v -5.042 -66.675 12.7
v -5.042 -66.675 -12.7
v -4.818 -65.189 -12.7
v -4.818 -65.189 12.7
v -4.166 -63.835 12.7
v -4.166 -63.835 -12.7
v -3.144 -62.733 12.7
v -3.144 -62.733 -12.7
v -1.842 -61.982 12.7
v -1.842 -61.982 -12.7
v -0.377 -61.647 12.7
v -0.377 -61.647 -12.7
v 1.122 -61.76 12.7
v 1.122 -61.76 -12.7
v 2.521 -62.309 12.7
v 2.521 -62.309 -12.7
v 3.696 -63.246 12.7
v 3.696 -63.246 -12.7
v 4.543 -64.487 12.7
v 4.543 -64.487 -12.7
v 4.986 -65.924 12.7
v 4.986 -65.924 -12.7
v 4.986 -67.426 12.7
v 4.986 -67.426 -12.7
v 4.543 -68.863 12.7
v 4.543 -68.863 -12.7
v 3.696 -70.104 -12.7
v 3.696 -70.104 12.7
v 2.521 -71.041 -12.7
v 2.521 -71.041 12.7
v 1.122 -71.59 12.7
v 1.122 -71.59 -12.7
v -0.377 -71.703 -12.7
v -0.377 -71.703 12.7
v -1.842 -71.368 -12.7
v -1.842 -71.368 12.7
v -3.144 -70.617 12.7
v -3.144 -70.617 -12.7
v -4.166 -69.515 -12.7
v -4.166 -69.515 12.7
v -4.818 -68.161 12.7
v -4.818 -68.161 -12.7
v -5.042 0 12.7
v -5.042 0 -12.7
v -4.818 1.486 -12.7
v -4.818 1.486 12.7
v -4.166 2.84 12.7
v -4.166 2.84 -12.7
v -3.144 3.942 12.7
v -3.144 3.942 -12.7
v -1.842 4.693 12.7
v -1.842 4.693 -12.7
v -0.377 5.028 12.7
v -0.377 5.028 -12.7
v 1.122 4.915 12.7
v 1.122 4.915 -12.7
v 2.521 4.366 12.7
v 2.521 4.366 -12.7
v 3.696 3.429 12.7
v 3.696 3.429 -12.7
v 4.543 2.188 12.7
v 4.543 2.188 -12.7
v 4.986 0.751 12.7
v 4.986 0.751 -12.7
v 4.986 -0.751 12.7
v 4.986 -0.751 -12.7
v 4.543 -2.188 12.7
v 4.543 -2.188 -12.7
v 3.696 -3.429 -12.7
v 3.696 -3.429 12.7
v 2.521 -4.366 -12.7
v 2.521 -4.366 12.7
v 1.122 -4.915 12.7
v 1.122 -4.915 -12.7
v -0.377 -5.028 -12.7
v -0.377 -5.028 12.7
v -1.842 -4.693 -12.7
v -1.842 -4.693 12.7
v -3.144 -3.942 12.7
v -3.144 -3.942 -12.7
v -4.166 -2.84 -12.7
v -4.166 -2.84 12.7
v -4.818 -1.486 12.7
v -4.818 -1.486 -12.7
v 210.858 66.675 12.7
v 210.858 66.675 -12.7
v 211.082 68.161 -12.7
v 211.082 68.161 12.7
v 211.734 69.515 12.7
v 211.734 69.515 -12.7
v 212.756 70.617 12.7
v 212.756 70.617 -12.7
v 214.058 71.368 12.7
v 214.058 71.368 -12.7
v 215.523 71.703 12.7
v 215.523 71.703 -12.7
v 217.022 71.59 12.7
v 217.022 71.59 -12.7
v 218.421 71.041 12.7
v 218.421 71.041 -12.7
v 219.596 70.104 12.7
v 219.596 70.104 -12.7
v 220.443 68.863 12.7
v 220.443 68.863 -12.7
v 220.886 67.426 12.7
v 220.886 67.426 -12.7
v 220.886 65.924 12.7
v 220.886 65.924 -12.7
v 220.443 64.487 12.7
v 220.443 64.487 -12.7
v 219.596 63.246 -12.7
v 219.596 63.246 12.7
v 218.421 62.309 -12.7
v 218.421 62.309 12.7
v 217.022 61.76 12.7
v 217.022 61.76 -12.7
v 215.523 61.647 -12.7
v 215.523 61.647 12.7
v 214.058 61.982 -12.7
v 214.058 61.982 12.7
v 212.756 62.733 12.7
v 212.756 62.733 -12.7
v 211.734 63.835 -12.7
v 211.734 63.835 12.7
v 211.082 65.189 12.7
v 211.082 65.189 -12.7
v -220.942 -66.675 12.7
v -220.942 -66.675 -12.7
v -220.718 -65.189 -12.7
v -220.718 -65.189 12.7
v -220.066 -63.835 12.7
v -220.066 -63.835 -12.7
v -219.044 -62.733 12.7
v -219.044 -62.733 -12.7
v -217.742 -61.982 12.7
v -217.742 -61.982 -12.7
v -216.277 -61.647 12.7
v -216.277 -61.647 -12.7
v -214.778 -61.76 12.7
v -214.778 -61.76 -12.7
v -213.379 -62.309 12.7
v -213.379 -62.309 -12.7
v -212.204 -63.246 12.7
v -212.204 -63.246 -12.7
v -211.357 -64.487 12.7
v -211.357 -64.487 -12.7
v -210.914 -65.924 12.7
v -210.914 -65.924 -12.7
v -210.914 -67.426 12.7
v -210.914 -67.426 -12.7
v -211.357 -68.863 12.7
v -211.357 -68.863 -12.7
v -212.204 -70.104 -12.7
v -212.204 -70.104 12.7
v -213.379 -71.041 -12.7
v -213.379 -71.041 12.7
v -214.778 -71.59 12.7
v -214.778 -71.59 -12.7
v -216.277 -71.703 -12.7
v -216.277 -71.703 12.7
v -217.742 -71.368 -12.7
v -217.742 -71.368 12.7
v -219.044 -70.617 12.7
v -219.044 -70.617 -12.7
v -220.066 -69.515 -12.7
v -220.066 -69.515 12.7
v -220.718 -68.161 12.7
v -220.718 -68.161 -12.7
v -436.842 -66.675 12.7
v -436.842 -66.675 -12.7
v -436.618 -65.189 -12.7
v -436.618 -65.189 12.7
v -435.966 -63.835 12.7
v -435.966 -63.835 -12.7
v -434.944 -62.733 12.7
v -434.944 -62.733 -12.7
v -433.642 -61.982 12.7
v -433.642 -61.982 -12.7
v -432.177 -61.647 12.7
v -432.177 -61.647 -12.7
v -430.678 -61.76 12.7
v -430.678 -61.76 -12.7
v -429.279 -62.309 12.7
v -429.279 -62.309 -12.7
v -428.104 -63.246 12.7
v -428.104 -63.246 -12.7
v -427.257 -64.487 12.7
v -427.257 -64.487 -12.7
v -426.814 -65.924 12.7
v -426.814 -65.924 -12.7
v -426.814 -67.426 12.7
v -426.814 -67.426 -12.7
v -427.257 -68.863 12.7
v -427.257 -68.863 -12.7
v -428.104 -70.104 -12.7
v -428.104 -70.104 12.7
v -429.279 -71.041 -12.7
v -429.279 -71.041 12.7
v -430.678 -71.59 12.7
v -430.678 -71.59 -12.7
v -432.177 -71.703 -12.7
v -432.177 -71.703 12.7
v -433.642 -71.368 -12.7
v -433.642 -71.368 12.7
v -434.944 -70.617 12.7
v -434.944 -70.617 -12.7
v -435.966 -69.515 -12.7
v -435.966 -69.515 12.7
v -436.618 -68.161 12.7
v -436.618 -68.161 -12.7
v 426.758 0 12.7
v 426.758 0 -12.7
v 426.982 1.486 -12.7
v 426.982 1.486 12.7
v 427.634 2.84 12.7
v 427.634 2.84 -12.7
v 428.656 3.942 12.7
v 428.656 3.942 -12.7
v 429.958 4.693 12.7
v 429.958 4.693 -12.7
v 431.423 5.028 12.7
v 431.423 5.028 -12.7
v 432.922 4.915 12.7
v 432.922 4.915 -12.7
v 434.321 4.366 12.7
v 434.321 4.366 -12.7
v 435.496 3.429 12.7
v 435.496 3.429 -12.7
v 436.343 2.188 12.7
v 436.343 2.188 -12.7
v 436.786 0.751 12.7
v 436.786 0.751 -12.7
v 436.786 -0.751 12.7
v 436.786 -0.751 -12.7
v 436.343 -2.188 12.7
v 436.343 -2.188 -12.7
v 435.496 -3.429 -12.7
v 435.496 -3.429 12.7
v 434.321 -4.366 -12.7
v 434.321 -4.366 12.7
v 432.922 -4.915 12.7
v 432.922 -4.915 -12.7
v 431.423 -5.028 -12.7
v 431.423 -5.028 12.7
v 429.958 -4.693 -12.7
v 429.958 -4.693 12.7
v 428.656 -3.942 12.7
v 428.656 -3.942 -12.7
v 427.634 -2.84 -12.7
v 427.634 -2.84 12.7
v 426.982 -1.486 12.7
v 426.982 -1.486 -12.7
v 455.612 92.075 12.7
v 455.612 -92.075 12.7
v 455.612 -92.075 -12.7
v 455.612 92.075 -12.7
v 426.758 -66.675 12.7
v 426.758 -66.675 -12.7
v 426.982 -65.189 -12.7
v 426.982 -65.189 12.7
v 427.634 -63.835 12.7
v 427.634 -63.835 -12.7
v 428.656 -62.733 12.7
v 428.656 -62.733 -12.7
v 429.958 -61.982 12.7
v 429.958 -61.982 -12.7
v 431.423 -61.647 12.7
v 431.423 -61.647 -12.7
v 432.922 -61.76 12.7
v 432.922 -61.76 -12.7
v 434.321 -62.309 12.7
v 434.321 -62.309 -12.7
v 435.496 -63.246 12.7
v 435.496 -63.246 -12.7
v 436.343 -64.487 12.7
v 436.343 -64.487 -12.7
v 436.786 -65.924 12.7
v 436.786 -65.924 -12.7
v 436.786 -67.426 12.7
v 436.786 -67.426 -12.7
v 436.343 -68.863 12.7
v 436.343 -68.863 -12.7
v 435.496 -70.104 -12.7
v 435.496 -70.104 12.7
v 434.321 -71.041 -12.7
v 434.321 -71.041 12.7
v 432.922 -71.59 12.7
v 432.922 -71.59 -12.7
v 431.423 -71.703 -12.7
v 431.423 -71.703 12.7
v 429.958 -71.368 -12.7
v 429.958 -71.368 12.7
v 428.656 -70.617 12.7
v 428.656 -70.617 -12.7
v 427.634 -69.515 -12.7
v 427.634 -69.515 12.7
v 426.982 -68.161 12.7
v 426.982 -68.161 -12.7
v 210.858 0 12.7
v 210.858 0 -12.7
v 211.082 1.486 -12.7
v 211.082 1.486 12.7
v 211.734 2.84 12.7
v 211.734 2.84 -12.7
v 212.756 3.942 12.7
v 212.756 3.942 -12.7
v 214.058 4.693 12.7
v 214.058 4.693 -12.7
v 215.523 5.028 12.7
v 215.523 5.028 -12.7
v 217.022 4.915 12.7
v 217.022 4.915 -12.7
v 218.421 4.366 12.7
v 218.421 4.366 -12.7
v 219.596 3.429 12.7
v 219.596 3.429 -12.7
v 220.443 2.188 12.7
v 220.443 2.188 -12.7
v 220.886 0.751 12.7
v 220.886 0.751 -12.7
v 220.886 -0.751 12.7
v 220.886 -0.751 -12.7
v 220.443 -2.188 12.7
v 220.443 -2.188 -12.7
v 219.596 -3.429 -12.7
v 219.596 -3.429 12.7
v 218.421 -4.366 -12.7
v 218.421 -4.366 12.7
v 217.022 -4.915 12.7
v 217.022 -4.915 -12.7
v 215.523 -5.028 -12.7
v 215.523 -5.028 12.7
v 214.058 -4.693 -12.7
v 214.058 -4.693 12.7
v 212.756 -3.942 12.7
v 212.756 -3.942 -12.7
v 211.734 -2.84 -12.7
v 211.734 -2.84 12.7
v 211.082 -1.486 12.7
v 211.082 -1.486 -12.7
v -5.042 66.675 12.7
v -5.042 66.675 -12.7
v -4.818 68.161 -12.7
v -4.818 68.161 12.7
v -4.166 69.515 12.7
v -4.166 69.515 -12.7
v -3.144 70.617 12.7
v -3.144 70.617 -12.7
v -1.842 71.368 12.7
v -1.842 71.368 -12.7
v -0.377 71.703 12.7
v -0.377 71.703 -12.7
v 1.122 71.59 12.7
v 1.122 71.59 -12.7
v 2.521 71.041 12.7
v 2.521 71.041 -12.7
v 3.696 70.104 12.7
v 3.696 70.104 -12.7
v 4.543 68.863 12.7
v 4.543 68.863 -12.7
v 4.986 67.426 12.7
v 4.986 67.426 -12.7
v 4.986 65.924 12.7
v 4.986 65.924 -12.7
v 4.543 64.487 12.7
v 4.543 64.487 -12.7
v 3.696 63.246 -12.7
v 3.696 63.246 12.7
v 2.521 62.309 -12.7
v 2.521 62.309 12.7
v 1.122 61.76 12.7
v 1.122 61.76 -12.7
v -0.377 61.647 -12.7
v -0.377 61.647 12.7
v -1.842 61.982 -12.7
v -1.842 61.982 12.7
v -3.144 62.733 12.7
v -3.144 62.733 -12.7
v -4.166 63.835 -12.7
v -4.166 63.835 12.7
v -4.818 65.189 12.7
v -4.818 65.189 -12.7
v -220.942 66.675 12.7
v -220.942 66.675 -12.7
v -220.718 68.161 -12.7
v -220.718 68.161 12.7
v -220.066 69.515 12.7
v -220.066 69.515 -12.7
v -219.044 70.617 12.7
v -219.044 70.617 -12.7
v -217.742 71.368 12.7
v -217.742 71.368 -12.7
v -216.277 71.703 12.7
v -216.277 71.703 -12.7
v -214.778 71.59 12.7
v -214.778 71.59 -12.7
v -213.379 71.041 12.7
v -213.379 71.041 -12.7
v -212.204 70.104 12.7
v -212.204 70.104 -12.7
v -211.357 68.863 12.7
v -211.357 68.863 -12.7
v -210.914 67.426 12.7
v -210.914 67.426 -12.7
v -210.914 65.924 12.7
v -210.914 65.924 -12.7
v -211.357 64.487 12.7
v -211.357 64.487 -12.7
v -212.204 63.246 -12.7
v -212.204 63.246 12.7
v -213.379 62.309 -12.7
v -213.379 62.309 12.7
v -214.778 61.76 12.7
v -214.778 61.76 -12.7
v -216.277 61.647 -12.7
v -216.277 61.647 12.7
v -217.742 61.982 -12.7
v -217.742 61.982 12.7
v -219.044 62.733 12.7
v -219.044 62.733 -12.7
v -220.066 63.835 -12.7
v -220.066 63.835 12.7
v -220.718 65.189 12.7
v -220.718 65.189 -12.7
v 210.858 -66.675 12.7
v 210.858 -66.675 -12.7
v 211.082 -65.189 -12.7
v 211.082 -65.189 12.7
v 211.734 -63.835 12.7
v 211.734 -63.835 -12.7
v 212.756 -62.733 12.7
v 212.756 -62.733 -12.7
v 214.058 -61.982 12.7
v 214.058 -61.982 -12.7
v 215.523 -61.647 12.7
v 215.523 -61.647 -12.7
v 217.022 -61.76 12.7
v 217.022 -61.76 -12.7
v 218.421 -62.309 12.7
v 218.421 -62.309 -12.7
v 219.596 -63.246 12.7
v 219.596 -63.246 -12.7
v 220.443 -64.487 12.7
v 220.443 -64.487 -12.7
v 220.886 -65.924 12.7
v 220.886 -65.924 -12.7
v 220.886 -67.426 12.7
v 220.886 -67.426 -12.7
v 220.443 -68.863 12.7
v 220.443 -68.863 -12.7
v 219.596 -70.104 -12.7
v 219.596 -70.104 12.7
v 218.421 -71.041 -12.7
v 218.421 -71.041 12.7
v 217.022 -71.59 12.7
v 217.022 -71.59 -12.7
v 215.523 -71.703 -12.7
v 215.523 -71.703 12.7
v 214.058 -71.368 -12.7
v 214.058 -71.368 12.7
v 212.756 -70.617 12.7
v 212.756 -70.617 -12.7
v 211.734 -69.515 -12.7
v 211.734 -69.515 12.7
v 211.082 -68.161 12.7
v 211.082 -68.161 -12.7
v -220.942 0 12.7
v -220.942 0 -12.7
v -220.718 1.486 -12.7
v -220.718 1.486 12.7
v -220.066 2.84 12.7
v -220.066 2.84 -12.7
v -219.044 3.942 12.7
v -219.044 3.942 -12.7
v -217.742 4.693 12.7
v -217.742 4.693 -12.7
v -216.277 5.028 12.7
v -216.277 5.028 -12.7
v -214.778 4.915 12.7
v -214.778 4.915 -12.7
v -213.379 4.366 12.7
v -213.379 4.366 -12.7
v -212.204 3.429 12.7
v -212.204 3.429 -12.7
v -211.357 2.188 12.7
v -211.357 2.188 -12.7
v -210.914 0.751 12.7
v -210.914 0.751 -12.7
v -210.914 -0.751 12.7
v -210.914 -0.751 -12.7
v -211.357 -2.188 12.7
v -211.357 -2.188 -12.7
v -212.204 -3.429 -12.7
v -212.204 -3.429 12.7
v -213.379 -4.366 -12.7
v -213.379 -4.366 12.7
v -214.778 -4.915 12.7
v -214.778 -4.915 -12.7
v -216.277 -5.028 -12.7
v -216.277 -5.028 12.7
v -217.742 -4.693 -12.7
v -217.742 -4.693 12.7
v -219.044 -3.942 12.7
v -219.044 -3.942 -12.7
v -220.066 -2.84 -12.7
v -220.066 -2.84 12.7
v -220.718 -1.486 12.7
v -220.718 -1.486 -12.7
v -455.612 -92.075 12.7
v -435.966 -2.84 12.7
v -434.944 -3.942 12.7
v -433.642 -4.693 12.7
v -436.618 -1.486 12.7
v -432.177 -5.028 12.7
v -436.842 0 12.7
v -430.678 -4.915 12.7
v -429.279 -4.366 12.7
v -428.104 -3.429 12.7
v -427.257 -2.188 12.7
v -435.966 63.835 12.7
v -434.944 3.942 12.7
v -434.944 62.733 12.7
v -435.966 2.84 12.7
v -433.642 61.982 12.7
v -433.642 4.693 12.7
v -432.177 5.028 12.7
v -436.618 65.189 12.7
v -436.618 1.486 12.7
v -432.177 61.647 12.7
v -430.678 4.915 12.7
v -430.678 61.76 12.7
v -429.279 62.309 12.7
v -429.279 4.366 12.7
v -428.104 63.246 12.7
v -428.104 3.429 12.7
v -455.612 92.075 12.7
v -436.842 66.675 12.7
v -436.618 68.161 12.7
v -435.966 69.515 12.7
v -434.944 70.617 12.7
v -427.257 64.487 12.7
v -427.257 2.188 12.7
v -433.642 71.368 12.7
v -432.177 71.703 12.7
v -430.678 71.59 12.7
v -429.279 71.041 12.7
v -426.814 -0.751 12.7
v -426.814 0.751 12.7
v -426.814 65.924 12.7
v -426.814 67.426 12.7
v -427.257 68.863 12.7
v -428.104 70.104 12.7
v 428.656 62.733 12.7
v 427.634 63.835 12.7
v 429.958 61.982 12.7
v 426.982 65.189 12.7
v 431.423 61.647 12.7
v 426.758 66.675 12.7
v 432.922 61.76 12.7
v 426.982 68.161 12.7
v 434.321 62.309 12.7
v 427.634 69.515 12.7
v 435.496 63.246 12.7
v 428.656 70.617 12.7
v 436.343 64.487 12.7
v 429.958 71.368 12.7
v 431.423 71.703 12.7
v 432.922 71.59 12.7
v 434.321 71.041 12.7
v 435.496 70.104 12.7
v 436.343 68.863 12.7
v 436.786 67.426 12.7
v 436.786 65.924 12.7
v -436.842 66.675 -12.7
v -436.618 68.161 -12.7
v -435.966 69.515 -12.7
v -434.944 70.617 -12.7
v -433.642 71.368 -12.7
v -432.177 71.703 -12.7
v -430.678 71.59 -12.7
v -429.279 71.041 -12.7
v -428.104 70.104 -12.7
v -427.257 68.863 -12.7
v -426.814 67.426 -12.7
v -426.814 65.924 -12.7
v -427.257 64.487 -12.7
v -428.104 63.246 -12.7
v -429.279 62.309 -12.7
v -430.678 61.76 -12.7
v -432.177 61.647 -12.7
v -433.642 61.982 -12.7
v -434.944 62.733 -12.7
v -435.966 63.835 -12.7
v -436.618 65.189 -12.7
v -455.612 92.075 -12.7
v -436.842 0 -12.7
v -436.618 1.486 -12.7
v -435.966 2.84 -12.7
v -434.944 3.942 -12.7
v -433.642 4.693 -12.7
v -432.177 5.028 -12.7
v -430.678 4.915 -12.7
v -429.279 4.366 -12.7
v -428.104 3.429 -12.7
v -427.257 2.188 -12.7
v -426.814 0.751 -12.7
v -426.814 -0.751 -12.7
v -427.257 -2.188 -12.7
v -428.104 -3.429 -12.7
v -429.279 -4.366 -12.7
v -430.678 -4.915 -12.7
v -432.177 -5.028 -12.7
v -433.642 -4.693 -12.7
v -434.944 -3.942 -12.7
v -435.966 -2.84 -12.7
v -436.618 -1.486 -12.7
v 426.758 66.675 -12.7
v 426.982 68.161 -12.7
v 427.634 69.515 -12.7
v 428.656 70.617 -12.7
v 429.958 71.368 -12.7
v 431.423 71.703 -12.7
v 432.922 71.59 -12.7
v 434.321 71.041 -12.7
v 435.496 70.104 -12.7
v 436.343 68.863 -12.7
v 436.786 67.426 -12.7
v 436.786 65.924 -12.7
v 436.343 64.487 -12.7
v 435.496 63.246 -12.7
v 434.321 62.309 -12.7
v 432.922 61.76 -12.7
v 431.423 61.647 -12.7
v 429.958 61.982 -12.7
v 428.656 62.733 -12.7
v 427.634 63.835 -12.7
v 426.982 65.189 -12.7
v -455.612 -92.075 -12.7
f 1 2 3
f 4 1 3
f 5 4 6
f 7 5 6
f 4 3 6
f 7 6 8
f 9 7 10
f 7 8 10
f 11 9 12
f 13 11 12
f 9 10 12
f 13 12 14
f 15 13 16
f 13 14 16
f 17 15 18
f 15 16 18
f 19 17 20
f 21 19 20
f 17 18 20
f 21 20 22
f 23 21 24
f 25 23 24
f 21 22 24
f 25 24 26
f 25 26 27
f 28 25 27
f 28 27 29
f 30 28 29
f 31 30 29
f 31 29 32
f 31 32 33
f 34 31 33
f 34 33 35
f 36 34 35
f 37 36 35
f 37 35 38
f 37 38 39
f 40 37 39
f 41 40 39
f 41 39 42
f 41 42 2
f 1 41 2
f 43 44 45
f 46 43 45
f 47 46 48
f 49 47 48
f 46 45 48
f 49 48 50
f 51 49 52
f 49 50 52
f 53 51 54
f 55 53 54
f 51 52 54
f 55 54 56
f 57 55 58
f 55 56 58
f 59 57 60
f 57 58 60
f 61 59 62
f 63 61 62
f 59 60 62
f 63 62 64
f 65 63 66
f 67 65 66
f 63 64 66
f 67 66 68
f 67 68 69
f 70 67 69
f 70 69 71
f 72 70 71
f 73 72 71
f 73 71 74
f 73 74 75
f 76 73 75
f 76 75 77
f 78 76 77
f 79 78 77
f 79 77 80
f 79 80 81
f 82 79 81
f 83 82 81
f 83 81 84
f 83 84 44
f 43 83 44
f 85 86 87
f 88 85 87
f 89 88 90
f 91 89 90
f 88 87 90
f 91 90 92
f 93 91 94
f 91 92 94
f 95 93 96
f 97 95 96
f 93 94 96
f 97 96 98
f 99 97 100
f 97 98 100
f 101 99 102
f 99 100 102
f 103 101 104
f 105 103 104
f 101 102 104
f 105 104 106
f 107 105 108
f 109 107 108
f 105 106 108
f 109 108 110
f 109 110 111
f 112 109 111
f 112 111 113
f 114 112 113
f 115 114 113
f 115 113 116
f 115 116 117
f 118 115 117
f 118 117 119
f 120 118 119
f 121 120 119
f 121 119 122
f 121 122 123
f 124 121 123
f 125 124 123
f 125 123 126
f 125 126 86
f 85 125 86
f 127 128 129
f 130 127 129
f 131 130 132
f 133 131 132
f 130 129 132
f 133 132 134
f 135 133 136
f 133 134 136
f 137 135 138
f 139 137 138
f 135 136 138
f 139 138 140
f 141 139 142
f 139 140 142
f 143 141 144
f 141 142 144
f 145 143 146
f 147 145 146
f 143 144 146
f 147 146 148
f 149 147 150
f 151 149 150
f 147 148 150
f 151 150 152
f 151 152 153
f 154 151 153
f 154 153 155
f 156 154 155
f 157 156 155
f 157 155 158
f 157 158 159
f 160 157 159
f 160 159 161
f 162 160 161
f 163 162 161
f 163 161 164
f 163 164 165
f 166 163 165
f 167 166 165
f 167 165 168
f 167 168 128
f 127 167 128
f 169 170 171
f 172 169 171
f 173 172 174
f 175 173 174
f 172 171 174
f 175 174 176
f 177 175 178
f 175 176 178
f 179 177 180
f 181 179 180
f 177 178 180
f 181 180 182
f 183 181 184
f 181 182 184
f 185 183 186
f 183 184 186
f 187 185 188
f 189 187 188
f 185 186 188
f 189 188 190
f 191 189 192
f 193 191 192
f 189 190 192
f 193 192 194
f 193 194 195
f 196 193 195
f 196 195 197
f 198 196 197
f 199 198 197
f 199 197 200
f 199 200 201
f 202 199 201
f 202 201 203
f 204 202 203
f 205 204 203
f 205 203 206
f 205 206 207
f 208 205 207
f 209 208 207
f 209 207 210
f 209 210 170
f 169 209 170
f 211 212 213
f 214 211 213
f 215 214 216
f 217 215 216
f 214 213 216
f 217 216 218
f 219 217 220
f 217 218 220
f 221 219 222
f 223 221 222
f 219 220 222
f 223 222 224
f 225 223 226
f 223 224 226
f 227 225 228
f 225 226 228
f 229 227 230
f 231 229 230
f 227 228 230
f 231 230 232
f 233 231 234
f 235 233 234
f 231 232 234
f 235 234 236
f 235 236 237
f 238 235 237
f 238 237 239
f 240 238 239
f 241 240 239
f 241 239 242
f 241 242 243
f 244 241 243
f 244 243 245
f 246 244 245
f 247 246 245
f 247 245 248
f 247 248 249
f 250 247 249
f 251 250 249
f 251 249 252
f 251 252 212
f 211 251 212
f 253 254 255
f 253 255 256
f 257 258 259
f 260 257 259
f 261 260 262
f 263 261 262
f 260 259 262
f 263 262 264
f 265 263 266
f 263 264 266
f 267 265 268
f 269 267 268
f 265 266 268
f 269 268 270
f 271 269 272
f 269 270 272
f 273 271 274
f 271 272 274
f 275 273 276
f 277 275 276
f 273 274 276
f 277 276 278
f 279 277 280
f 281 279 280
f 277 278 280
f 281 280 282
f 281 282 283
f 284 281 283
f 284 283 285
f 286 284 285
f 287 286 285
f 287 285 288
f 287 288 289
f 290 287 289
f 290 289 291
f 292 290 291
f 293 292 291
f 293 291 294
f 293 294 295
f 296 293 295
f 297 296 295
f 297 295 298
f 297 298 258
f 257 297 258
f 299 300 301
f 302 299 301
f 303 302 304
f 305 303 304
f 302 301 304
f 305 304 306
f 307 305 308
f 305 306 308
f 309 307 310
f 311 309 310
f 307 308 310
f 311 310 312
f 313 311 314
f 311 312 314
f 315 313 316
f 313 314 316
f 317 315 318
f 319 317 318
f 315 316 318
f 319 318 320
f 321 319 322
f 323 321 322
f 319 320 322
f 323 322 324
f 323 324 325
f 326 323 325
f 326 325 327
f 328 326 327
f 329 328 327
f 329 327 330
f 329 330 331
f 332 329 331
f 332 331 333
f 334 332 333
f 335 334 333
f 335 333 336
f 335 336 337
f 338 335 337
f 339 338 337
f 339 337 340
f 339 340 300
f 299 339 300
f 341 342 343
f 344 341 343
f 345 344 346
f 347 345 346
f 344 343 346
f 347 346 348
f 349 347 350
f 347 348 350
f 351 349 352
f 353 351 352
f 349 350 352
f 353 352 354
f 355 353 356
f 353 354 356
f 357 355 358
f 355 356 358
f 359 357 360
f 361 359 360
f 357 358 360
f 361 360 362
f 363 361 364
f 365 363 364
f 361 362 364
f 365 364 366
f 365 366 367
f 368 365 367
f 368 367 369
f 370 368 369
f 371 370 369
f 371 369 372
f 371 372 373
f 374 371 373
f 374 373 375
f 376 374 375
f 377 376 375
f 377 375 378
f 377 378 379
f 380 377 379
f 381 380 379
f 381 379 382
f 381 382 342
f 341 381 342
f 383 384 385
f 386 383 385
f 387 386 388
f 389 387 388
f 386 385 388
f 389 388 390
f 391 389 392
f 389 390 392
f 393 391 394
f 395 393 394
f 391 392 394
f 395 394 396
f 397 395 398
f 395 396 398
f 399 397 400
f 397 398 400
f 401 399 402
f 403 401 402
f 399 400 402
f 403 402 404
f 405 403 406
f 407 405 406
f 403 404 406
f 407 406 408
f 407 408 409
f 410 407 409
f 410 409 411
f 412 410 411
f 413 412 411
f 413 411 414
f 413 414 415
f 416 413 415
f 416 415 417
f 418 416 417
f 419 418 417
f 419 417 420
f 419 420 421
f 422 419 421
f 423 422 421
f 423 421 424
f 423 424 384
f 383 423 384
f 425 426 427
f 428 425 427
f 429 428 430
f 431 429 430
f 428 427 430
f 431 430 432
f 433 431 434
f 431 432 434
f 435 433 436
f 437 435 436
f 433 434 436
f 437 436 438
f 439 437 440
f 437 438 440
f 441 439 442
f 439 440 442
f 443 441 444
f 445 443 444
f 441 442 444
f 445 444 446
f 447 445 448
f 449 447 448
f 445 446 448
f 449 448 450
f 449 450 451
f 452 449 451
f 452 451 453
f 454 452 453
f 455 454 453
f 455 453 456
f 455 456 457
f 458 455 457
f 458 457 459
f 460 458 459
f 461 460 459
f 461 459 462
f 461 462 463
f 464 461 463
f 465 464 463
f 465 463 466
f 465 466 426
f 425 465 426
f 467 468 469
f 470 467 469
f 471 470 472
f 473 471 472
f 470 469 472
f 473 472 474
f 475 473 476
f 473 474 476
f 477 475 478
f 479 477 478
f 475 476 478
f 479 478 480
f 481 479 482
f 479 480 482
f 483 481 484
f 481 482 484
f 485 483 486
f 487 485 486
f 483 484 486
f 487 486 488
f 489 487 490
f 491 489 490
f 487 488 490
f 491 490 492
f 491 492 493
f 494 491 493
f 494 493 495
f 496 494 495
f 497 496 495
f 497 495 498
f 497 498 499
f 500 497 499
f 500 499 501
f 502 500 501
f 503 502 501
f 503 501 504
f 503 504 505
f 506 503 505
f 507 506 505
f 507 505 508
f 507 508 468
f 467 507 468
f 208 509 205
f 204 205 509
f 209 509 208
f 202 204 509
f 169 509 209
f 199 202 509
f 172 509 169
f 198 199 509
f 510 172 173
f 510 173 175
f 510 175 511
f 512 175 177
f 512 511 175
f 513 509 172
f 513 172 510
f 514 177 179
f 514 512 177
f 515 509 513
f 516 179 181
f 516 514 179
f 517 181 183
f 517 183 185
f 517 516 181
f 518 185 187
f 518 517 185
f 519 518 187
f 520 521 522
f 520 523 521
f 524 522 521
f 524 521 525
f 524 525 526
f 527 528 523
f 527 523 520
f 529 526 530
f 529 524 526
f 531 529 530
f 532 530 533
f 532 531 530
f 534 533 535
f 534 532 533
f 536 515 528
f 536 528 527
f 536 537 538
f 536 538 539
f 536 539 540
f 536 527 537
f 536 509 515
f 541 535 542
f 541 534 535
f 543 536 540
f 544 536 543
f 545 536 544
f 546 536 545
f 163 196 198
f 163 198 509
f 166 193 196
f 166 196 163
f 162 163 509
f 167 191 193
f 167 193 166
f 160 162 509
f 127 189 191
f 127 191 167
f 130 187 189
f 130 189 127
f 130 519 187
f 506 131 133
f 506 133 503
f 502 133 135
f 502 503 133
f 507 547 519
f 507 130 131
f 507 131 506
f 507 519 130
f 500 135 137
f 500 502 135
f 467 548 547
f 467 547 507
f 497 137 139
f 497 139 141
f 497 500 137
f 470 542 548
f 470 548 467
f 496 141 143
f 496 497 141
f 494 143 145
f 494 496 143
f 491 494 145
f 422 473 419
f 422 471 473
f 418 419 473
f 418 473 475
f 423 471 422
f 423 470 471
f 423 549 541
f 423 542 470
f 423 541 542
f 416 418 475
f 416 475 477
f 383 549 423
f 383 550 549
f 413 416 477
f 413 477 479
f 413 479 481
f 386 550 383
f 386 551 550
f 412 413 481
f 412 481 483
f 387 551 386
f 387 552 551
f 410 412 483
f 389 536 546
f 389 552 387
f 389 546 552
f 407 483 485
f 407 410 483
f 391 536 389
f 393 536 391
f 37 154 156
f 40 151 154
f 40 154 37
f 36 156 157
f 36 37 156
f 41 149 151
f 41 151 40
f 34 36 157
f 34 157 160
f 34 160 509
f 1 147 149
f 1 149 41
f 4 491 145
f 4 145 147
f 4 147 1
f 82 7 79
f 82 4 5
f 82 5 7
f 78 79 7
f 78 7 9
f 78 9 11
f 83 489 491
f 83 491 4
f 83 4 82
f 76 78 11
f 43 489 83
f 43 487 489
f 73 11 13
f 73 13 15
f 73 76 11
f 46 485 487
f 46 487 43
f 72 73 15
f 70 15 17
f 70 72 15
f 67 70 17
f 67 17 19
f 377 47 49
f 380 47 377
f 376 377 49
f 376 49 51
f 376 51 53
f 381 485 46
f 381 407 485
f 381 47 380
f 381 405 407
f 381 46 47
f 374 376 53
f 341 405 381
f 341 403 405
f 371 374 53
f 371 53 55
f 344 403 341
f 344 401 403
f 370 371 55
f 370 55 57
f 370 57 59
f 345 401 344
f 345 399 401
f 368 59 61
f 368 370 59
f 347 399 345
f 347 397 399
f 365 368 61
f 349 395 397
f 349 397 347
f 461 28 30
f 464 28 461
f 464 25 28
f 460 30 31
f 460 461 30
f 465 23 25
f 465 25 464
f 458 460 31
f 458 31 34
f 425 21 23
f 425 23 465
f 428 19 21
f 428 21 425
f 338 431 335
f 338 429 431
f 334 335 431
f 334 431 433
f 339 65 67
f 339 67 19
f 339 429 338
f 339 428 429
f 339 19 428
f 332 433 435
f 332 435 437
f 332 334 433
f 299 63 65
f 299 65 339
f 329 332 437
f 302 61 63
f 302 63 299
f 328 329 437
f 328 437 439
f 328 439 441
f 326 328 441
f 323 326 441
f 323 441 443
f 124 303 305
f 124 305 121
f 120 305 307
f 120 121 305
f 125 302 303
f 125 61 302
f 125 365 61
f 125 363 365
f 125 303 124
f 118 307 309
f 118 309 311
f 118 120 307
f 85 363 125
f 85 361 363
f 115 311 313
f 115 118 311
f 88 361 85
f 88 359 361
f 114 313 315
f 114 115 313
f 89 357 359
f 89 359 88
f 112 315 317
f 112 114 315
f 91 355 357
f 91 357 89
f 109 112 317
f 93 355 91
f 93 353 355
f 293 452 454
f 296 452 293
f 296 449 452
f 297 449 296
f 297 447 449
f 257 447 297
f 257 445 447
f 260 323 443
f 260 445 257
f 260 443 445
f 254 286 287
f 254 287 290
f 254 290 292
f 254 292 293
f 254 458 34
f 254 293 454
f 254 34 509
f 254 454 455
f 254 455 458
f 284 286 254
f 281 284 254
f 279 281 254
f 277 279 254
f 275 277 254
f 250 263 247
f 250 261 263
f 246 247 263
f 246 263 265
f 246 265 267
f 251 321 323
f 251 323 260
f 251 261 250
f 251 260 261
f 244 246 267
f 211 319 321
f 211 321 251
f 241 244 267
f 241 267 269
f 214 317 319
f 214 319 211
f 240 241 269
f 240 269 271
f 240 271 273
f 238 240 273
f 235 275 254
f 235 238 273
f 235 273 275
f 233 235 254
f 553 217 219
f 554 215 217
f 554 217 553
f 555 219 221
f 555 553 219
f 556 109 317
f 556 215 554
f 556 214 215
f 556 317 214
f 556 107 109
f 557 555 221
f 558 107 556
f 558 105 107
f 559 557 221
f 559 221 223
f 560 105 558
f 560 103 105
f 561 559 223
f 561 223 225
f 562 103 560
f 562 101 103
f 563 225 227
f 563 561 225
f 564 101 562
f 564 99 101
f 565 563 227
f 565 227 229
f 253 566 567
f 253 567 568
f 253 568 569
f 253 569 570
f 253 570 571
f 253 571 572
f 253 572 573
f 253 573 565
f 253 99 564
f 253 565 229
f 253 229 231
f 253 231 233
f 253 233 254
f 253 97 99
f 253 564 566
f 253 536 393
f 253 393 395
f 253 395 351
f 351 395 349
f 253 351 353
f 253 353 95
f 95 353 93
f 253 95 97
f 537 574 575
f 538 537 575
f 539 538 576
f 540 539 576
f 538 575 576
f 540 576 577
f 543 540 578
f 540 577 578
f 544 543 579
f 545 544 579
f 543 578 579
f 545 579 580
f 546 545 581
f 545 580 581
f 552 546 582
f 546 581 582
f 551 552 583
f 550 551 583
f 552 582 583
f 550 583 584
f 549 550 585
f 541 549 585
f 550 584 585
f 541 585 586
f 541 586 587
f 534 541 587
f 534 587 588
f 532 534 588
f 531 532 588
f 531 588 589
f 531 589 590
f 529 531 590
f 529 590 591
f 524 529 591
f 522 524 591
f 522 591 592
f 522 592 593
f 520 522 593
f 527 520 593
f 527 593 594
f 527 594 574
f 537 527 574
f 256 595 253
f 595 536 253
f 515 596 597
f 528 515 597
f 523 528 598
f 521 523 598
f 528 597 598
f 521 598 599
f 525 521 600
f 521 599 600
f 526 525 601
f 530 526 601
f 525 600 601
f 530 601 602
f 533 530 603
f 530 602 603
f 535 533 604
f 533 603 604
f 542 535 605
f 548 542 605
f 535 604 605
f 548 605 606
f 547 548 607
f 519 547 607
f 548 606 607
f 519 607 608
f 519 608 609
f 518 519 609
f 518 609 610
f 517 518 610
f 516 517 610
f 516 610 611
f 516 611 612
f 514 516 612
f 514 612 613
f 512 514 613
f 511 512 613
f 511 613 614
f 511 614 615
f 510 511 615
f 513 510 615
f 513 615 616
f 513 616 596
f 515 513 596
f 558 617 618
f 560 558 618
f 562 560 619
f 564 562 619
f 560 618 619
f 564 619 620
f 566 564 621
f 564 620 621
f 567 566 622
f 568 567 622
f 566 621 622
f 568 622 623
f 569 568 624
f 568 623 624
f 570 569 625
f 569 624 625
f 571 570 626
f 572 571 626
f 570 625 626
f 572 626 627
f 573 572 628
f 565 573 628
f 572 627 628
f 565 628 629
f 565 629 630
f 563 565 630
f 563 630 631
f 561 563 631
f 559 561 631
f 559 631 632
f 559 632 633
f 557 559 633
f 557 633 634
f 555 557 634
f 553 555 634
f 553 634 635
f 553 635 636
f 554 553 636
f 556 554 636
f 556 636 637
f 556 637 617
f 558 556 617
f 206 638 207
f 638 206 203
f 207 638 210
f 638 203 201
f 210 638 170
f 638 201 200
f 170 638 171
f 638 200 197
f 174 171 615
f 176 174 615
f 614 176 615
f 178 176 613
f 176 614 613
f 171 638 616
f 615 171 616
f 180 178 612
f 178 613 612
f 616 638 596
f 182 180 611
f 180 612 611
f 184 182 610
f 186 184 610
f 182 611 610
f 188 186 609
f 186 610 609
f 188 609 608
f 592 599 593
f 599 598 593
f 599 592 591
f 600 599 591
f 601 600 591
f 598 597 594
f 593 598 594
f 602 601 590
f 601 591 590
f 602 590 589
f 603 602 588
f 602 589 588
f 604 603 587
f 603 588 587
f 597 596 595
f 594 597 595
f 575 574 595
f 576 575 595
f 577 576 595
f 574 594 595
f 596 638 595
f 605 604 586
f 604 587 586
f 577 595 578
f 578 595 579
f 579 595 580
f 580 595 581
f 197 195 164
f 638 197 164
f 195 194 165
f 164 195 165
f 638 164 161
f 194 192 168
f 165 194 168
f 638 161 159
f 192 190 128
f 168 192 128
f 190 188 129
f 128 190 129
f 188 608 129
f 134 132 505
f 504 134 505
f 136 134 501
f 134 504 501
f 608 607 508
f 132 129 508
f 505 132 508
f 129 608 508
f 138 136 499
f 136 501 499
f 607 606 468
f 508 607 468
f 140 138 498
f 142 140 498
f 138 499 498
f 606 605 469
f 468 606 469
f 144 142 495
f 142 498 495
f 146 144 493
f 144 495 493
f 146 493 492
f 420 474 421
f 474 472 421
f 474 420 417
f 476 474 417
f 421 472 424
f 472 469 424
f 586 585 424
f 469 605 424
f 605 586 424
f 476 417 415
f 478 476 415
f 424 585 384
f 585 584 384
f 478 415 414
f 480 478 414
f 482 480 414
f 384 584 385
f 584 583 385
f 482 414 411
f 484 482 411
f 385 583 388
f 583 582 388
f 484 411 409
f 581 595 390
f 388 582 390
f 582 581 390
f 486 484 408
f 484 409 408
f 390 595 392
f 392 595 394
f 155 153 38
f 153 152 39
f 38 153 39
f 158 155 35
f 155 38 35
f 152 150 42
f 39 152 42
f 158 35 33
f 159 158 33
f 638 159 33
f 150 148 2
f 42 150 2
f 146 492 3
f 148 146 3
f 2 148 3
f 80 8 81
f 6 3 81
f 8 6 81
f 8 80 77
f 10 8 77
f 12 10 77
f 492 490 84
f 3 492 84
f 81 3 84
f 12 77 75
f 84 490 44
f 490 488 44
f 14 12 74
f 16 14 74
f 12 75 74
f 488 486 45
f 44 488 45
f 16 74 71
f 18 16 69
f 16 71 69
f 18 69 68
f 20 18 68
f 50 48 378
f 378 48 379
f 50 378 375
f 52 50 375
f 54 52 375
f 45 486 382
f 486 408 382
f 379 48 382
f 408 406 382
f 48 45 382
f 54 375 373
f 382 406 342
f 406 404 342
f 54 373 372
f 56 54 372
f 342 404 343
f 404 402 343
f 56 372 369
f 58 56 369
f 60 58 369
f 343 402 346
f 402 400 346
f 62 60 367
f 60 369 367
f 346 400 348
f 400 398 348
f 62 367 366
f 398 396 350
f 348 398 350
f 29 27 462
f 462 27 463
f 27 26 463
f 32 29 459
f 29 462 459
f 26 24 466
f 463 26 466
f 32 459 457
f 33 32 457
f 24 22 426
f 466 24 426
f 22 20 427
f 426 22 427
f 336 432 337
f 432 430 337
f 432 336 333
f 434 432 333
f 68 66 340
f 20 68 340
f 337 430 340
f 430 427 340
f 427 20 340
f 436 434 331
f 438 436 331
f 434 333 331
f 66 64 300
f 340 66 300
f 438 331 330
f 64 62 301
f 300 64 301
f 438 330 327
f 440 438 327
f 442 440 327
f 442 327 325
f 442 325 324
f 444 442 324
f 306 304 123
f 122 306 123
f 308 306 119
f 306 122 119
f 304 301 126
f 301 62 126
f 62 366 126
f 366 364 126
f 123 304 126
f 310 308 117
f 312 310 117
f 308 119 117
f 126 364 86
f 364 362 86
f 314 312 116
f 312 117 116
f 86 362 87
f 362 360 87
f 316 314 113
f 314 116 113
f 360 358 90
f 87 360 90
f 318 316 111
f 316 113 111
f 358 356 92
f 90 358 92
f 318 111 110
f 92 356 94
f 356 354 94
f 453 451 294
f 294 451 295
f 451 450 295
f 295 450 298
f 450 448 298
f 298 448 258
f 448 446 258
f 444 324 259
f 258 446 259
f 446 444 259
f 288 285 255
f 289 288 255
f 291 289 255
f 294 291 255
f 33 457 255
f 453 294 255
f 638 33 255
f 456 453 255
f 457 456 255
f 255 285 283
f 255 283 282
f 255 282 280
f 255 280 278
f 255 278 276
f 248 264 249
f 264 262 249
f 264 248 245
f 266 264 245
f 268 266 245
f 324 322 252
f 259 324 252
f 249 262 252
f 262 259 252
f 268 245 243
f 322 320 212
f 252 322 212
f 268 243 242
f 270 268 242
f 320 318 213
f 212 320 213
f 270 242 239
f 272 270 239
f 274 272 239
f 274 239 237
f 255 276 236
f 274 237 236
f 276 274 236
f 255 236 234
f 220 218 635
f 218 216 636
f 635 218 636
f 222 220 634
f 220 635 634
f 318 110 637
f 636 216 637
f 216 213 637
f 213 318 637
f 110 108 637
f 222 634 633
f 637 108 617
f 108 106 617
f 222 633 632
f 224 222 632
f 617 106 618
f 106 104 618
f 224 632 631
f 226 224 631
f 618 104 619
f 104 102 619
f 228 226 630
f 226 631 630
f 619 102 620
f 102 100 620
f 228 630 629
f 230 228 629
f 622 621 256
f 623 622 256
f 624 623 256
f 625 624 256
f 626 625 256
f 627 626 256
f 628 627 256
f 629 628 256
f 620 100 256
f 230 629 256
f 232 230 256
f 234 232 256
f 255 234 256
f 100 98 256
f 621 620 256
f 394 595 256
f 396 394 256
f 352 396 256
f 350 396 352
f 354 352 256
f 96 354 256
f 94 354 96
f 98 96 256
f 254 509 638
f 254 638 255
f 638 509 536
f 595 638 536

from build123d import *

# Parameters (mm, degrees)
F0_W     = 911.225
F0_H     = 184.15
F1_DEPTH = 12.7
F3_D     = 10.0838


with BuildPart() as f1:
    # F0 (on Top) → F1 (new body, symmetric)
    with BuildSketch(Plane.XY):
        Rectangle(F0_W, F0_H)
    extrude(amount=F1_DEPTH, both=True)

    # F3 (through all)
    with Locations(Plane.XY.offset(12.7)):
        with Locations((-431.8, 66.675), (-431.8, 0), (-431.8, -66.675), (-215.9, -66.675), (-215.9, 0), (-215.9, 66.675), (0, 66.675), (0, 0), (215.9, 66.675), (215.9, 0), (215.9, -66.675), (431.8, -66.675), (431.8, 0), (431.8, 66.675), (0, -66.675)):
            Hole(F3_D / 2)


solid = f1.part
